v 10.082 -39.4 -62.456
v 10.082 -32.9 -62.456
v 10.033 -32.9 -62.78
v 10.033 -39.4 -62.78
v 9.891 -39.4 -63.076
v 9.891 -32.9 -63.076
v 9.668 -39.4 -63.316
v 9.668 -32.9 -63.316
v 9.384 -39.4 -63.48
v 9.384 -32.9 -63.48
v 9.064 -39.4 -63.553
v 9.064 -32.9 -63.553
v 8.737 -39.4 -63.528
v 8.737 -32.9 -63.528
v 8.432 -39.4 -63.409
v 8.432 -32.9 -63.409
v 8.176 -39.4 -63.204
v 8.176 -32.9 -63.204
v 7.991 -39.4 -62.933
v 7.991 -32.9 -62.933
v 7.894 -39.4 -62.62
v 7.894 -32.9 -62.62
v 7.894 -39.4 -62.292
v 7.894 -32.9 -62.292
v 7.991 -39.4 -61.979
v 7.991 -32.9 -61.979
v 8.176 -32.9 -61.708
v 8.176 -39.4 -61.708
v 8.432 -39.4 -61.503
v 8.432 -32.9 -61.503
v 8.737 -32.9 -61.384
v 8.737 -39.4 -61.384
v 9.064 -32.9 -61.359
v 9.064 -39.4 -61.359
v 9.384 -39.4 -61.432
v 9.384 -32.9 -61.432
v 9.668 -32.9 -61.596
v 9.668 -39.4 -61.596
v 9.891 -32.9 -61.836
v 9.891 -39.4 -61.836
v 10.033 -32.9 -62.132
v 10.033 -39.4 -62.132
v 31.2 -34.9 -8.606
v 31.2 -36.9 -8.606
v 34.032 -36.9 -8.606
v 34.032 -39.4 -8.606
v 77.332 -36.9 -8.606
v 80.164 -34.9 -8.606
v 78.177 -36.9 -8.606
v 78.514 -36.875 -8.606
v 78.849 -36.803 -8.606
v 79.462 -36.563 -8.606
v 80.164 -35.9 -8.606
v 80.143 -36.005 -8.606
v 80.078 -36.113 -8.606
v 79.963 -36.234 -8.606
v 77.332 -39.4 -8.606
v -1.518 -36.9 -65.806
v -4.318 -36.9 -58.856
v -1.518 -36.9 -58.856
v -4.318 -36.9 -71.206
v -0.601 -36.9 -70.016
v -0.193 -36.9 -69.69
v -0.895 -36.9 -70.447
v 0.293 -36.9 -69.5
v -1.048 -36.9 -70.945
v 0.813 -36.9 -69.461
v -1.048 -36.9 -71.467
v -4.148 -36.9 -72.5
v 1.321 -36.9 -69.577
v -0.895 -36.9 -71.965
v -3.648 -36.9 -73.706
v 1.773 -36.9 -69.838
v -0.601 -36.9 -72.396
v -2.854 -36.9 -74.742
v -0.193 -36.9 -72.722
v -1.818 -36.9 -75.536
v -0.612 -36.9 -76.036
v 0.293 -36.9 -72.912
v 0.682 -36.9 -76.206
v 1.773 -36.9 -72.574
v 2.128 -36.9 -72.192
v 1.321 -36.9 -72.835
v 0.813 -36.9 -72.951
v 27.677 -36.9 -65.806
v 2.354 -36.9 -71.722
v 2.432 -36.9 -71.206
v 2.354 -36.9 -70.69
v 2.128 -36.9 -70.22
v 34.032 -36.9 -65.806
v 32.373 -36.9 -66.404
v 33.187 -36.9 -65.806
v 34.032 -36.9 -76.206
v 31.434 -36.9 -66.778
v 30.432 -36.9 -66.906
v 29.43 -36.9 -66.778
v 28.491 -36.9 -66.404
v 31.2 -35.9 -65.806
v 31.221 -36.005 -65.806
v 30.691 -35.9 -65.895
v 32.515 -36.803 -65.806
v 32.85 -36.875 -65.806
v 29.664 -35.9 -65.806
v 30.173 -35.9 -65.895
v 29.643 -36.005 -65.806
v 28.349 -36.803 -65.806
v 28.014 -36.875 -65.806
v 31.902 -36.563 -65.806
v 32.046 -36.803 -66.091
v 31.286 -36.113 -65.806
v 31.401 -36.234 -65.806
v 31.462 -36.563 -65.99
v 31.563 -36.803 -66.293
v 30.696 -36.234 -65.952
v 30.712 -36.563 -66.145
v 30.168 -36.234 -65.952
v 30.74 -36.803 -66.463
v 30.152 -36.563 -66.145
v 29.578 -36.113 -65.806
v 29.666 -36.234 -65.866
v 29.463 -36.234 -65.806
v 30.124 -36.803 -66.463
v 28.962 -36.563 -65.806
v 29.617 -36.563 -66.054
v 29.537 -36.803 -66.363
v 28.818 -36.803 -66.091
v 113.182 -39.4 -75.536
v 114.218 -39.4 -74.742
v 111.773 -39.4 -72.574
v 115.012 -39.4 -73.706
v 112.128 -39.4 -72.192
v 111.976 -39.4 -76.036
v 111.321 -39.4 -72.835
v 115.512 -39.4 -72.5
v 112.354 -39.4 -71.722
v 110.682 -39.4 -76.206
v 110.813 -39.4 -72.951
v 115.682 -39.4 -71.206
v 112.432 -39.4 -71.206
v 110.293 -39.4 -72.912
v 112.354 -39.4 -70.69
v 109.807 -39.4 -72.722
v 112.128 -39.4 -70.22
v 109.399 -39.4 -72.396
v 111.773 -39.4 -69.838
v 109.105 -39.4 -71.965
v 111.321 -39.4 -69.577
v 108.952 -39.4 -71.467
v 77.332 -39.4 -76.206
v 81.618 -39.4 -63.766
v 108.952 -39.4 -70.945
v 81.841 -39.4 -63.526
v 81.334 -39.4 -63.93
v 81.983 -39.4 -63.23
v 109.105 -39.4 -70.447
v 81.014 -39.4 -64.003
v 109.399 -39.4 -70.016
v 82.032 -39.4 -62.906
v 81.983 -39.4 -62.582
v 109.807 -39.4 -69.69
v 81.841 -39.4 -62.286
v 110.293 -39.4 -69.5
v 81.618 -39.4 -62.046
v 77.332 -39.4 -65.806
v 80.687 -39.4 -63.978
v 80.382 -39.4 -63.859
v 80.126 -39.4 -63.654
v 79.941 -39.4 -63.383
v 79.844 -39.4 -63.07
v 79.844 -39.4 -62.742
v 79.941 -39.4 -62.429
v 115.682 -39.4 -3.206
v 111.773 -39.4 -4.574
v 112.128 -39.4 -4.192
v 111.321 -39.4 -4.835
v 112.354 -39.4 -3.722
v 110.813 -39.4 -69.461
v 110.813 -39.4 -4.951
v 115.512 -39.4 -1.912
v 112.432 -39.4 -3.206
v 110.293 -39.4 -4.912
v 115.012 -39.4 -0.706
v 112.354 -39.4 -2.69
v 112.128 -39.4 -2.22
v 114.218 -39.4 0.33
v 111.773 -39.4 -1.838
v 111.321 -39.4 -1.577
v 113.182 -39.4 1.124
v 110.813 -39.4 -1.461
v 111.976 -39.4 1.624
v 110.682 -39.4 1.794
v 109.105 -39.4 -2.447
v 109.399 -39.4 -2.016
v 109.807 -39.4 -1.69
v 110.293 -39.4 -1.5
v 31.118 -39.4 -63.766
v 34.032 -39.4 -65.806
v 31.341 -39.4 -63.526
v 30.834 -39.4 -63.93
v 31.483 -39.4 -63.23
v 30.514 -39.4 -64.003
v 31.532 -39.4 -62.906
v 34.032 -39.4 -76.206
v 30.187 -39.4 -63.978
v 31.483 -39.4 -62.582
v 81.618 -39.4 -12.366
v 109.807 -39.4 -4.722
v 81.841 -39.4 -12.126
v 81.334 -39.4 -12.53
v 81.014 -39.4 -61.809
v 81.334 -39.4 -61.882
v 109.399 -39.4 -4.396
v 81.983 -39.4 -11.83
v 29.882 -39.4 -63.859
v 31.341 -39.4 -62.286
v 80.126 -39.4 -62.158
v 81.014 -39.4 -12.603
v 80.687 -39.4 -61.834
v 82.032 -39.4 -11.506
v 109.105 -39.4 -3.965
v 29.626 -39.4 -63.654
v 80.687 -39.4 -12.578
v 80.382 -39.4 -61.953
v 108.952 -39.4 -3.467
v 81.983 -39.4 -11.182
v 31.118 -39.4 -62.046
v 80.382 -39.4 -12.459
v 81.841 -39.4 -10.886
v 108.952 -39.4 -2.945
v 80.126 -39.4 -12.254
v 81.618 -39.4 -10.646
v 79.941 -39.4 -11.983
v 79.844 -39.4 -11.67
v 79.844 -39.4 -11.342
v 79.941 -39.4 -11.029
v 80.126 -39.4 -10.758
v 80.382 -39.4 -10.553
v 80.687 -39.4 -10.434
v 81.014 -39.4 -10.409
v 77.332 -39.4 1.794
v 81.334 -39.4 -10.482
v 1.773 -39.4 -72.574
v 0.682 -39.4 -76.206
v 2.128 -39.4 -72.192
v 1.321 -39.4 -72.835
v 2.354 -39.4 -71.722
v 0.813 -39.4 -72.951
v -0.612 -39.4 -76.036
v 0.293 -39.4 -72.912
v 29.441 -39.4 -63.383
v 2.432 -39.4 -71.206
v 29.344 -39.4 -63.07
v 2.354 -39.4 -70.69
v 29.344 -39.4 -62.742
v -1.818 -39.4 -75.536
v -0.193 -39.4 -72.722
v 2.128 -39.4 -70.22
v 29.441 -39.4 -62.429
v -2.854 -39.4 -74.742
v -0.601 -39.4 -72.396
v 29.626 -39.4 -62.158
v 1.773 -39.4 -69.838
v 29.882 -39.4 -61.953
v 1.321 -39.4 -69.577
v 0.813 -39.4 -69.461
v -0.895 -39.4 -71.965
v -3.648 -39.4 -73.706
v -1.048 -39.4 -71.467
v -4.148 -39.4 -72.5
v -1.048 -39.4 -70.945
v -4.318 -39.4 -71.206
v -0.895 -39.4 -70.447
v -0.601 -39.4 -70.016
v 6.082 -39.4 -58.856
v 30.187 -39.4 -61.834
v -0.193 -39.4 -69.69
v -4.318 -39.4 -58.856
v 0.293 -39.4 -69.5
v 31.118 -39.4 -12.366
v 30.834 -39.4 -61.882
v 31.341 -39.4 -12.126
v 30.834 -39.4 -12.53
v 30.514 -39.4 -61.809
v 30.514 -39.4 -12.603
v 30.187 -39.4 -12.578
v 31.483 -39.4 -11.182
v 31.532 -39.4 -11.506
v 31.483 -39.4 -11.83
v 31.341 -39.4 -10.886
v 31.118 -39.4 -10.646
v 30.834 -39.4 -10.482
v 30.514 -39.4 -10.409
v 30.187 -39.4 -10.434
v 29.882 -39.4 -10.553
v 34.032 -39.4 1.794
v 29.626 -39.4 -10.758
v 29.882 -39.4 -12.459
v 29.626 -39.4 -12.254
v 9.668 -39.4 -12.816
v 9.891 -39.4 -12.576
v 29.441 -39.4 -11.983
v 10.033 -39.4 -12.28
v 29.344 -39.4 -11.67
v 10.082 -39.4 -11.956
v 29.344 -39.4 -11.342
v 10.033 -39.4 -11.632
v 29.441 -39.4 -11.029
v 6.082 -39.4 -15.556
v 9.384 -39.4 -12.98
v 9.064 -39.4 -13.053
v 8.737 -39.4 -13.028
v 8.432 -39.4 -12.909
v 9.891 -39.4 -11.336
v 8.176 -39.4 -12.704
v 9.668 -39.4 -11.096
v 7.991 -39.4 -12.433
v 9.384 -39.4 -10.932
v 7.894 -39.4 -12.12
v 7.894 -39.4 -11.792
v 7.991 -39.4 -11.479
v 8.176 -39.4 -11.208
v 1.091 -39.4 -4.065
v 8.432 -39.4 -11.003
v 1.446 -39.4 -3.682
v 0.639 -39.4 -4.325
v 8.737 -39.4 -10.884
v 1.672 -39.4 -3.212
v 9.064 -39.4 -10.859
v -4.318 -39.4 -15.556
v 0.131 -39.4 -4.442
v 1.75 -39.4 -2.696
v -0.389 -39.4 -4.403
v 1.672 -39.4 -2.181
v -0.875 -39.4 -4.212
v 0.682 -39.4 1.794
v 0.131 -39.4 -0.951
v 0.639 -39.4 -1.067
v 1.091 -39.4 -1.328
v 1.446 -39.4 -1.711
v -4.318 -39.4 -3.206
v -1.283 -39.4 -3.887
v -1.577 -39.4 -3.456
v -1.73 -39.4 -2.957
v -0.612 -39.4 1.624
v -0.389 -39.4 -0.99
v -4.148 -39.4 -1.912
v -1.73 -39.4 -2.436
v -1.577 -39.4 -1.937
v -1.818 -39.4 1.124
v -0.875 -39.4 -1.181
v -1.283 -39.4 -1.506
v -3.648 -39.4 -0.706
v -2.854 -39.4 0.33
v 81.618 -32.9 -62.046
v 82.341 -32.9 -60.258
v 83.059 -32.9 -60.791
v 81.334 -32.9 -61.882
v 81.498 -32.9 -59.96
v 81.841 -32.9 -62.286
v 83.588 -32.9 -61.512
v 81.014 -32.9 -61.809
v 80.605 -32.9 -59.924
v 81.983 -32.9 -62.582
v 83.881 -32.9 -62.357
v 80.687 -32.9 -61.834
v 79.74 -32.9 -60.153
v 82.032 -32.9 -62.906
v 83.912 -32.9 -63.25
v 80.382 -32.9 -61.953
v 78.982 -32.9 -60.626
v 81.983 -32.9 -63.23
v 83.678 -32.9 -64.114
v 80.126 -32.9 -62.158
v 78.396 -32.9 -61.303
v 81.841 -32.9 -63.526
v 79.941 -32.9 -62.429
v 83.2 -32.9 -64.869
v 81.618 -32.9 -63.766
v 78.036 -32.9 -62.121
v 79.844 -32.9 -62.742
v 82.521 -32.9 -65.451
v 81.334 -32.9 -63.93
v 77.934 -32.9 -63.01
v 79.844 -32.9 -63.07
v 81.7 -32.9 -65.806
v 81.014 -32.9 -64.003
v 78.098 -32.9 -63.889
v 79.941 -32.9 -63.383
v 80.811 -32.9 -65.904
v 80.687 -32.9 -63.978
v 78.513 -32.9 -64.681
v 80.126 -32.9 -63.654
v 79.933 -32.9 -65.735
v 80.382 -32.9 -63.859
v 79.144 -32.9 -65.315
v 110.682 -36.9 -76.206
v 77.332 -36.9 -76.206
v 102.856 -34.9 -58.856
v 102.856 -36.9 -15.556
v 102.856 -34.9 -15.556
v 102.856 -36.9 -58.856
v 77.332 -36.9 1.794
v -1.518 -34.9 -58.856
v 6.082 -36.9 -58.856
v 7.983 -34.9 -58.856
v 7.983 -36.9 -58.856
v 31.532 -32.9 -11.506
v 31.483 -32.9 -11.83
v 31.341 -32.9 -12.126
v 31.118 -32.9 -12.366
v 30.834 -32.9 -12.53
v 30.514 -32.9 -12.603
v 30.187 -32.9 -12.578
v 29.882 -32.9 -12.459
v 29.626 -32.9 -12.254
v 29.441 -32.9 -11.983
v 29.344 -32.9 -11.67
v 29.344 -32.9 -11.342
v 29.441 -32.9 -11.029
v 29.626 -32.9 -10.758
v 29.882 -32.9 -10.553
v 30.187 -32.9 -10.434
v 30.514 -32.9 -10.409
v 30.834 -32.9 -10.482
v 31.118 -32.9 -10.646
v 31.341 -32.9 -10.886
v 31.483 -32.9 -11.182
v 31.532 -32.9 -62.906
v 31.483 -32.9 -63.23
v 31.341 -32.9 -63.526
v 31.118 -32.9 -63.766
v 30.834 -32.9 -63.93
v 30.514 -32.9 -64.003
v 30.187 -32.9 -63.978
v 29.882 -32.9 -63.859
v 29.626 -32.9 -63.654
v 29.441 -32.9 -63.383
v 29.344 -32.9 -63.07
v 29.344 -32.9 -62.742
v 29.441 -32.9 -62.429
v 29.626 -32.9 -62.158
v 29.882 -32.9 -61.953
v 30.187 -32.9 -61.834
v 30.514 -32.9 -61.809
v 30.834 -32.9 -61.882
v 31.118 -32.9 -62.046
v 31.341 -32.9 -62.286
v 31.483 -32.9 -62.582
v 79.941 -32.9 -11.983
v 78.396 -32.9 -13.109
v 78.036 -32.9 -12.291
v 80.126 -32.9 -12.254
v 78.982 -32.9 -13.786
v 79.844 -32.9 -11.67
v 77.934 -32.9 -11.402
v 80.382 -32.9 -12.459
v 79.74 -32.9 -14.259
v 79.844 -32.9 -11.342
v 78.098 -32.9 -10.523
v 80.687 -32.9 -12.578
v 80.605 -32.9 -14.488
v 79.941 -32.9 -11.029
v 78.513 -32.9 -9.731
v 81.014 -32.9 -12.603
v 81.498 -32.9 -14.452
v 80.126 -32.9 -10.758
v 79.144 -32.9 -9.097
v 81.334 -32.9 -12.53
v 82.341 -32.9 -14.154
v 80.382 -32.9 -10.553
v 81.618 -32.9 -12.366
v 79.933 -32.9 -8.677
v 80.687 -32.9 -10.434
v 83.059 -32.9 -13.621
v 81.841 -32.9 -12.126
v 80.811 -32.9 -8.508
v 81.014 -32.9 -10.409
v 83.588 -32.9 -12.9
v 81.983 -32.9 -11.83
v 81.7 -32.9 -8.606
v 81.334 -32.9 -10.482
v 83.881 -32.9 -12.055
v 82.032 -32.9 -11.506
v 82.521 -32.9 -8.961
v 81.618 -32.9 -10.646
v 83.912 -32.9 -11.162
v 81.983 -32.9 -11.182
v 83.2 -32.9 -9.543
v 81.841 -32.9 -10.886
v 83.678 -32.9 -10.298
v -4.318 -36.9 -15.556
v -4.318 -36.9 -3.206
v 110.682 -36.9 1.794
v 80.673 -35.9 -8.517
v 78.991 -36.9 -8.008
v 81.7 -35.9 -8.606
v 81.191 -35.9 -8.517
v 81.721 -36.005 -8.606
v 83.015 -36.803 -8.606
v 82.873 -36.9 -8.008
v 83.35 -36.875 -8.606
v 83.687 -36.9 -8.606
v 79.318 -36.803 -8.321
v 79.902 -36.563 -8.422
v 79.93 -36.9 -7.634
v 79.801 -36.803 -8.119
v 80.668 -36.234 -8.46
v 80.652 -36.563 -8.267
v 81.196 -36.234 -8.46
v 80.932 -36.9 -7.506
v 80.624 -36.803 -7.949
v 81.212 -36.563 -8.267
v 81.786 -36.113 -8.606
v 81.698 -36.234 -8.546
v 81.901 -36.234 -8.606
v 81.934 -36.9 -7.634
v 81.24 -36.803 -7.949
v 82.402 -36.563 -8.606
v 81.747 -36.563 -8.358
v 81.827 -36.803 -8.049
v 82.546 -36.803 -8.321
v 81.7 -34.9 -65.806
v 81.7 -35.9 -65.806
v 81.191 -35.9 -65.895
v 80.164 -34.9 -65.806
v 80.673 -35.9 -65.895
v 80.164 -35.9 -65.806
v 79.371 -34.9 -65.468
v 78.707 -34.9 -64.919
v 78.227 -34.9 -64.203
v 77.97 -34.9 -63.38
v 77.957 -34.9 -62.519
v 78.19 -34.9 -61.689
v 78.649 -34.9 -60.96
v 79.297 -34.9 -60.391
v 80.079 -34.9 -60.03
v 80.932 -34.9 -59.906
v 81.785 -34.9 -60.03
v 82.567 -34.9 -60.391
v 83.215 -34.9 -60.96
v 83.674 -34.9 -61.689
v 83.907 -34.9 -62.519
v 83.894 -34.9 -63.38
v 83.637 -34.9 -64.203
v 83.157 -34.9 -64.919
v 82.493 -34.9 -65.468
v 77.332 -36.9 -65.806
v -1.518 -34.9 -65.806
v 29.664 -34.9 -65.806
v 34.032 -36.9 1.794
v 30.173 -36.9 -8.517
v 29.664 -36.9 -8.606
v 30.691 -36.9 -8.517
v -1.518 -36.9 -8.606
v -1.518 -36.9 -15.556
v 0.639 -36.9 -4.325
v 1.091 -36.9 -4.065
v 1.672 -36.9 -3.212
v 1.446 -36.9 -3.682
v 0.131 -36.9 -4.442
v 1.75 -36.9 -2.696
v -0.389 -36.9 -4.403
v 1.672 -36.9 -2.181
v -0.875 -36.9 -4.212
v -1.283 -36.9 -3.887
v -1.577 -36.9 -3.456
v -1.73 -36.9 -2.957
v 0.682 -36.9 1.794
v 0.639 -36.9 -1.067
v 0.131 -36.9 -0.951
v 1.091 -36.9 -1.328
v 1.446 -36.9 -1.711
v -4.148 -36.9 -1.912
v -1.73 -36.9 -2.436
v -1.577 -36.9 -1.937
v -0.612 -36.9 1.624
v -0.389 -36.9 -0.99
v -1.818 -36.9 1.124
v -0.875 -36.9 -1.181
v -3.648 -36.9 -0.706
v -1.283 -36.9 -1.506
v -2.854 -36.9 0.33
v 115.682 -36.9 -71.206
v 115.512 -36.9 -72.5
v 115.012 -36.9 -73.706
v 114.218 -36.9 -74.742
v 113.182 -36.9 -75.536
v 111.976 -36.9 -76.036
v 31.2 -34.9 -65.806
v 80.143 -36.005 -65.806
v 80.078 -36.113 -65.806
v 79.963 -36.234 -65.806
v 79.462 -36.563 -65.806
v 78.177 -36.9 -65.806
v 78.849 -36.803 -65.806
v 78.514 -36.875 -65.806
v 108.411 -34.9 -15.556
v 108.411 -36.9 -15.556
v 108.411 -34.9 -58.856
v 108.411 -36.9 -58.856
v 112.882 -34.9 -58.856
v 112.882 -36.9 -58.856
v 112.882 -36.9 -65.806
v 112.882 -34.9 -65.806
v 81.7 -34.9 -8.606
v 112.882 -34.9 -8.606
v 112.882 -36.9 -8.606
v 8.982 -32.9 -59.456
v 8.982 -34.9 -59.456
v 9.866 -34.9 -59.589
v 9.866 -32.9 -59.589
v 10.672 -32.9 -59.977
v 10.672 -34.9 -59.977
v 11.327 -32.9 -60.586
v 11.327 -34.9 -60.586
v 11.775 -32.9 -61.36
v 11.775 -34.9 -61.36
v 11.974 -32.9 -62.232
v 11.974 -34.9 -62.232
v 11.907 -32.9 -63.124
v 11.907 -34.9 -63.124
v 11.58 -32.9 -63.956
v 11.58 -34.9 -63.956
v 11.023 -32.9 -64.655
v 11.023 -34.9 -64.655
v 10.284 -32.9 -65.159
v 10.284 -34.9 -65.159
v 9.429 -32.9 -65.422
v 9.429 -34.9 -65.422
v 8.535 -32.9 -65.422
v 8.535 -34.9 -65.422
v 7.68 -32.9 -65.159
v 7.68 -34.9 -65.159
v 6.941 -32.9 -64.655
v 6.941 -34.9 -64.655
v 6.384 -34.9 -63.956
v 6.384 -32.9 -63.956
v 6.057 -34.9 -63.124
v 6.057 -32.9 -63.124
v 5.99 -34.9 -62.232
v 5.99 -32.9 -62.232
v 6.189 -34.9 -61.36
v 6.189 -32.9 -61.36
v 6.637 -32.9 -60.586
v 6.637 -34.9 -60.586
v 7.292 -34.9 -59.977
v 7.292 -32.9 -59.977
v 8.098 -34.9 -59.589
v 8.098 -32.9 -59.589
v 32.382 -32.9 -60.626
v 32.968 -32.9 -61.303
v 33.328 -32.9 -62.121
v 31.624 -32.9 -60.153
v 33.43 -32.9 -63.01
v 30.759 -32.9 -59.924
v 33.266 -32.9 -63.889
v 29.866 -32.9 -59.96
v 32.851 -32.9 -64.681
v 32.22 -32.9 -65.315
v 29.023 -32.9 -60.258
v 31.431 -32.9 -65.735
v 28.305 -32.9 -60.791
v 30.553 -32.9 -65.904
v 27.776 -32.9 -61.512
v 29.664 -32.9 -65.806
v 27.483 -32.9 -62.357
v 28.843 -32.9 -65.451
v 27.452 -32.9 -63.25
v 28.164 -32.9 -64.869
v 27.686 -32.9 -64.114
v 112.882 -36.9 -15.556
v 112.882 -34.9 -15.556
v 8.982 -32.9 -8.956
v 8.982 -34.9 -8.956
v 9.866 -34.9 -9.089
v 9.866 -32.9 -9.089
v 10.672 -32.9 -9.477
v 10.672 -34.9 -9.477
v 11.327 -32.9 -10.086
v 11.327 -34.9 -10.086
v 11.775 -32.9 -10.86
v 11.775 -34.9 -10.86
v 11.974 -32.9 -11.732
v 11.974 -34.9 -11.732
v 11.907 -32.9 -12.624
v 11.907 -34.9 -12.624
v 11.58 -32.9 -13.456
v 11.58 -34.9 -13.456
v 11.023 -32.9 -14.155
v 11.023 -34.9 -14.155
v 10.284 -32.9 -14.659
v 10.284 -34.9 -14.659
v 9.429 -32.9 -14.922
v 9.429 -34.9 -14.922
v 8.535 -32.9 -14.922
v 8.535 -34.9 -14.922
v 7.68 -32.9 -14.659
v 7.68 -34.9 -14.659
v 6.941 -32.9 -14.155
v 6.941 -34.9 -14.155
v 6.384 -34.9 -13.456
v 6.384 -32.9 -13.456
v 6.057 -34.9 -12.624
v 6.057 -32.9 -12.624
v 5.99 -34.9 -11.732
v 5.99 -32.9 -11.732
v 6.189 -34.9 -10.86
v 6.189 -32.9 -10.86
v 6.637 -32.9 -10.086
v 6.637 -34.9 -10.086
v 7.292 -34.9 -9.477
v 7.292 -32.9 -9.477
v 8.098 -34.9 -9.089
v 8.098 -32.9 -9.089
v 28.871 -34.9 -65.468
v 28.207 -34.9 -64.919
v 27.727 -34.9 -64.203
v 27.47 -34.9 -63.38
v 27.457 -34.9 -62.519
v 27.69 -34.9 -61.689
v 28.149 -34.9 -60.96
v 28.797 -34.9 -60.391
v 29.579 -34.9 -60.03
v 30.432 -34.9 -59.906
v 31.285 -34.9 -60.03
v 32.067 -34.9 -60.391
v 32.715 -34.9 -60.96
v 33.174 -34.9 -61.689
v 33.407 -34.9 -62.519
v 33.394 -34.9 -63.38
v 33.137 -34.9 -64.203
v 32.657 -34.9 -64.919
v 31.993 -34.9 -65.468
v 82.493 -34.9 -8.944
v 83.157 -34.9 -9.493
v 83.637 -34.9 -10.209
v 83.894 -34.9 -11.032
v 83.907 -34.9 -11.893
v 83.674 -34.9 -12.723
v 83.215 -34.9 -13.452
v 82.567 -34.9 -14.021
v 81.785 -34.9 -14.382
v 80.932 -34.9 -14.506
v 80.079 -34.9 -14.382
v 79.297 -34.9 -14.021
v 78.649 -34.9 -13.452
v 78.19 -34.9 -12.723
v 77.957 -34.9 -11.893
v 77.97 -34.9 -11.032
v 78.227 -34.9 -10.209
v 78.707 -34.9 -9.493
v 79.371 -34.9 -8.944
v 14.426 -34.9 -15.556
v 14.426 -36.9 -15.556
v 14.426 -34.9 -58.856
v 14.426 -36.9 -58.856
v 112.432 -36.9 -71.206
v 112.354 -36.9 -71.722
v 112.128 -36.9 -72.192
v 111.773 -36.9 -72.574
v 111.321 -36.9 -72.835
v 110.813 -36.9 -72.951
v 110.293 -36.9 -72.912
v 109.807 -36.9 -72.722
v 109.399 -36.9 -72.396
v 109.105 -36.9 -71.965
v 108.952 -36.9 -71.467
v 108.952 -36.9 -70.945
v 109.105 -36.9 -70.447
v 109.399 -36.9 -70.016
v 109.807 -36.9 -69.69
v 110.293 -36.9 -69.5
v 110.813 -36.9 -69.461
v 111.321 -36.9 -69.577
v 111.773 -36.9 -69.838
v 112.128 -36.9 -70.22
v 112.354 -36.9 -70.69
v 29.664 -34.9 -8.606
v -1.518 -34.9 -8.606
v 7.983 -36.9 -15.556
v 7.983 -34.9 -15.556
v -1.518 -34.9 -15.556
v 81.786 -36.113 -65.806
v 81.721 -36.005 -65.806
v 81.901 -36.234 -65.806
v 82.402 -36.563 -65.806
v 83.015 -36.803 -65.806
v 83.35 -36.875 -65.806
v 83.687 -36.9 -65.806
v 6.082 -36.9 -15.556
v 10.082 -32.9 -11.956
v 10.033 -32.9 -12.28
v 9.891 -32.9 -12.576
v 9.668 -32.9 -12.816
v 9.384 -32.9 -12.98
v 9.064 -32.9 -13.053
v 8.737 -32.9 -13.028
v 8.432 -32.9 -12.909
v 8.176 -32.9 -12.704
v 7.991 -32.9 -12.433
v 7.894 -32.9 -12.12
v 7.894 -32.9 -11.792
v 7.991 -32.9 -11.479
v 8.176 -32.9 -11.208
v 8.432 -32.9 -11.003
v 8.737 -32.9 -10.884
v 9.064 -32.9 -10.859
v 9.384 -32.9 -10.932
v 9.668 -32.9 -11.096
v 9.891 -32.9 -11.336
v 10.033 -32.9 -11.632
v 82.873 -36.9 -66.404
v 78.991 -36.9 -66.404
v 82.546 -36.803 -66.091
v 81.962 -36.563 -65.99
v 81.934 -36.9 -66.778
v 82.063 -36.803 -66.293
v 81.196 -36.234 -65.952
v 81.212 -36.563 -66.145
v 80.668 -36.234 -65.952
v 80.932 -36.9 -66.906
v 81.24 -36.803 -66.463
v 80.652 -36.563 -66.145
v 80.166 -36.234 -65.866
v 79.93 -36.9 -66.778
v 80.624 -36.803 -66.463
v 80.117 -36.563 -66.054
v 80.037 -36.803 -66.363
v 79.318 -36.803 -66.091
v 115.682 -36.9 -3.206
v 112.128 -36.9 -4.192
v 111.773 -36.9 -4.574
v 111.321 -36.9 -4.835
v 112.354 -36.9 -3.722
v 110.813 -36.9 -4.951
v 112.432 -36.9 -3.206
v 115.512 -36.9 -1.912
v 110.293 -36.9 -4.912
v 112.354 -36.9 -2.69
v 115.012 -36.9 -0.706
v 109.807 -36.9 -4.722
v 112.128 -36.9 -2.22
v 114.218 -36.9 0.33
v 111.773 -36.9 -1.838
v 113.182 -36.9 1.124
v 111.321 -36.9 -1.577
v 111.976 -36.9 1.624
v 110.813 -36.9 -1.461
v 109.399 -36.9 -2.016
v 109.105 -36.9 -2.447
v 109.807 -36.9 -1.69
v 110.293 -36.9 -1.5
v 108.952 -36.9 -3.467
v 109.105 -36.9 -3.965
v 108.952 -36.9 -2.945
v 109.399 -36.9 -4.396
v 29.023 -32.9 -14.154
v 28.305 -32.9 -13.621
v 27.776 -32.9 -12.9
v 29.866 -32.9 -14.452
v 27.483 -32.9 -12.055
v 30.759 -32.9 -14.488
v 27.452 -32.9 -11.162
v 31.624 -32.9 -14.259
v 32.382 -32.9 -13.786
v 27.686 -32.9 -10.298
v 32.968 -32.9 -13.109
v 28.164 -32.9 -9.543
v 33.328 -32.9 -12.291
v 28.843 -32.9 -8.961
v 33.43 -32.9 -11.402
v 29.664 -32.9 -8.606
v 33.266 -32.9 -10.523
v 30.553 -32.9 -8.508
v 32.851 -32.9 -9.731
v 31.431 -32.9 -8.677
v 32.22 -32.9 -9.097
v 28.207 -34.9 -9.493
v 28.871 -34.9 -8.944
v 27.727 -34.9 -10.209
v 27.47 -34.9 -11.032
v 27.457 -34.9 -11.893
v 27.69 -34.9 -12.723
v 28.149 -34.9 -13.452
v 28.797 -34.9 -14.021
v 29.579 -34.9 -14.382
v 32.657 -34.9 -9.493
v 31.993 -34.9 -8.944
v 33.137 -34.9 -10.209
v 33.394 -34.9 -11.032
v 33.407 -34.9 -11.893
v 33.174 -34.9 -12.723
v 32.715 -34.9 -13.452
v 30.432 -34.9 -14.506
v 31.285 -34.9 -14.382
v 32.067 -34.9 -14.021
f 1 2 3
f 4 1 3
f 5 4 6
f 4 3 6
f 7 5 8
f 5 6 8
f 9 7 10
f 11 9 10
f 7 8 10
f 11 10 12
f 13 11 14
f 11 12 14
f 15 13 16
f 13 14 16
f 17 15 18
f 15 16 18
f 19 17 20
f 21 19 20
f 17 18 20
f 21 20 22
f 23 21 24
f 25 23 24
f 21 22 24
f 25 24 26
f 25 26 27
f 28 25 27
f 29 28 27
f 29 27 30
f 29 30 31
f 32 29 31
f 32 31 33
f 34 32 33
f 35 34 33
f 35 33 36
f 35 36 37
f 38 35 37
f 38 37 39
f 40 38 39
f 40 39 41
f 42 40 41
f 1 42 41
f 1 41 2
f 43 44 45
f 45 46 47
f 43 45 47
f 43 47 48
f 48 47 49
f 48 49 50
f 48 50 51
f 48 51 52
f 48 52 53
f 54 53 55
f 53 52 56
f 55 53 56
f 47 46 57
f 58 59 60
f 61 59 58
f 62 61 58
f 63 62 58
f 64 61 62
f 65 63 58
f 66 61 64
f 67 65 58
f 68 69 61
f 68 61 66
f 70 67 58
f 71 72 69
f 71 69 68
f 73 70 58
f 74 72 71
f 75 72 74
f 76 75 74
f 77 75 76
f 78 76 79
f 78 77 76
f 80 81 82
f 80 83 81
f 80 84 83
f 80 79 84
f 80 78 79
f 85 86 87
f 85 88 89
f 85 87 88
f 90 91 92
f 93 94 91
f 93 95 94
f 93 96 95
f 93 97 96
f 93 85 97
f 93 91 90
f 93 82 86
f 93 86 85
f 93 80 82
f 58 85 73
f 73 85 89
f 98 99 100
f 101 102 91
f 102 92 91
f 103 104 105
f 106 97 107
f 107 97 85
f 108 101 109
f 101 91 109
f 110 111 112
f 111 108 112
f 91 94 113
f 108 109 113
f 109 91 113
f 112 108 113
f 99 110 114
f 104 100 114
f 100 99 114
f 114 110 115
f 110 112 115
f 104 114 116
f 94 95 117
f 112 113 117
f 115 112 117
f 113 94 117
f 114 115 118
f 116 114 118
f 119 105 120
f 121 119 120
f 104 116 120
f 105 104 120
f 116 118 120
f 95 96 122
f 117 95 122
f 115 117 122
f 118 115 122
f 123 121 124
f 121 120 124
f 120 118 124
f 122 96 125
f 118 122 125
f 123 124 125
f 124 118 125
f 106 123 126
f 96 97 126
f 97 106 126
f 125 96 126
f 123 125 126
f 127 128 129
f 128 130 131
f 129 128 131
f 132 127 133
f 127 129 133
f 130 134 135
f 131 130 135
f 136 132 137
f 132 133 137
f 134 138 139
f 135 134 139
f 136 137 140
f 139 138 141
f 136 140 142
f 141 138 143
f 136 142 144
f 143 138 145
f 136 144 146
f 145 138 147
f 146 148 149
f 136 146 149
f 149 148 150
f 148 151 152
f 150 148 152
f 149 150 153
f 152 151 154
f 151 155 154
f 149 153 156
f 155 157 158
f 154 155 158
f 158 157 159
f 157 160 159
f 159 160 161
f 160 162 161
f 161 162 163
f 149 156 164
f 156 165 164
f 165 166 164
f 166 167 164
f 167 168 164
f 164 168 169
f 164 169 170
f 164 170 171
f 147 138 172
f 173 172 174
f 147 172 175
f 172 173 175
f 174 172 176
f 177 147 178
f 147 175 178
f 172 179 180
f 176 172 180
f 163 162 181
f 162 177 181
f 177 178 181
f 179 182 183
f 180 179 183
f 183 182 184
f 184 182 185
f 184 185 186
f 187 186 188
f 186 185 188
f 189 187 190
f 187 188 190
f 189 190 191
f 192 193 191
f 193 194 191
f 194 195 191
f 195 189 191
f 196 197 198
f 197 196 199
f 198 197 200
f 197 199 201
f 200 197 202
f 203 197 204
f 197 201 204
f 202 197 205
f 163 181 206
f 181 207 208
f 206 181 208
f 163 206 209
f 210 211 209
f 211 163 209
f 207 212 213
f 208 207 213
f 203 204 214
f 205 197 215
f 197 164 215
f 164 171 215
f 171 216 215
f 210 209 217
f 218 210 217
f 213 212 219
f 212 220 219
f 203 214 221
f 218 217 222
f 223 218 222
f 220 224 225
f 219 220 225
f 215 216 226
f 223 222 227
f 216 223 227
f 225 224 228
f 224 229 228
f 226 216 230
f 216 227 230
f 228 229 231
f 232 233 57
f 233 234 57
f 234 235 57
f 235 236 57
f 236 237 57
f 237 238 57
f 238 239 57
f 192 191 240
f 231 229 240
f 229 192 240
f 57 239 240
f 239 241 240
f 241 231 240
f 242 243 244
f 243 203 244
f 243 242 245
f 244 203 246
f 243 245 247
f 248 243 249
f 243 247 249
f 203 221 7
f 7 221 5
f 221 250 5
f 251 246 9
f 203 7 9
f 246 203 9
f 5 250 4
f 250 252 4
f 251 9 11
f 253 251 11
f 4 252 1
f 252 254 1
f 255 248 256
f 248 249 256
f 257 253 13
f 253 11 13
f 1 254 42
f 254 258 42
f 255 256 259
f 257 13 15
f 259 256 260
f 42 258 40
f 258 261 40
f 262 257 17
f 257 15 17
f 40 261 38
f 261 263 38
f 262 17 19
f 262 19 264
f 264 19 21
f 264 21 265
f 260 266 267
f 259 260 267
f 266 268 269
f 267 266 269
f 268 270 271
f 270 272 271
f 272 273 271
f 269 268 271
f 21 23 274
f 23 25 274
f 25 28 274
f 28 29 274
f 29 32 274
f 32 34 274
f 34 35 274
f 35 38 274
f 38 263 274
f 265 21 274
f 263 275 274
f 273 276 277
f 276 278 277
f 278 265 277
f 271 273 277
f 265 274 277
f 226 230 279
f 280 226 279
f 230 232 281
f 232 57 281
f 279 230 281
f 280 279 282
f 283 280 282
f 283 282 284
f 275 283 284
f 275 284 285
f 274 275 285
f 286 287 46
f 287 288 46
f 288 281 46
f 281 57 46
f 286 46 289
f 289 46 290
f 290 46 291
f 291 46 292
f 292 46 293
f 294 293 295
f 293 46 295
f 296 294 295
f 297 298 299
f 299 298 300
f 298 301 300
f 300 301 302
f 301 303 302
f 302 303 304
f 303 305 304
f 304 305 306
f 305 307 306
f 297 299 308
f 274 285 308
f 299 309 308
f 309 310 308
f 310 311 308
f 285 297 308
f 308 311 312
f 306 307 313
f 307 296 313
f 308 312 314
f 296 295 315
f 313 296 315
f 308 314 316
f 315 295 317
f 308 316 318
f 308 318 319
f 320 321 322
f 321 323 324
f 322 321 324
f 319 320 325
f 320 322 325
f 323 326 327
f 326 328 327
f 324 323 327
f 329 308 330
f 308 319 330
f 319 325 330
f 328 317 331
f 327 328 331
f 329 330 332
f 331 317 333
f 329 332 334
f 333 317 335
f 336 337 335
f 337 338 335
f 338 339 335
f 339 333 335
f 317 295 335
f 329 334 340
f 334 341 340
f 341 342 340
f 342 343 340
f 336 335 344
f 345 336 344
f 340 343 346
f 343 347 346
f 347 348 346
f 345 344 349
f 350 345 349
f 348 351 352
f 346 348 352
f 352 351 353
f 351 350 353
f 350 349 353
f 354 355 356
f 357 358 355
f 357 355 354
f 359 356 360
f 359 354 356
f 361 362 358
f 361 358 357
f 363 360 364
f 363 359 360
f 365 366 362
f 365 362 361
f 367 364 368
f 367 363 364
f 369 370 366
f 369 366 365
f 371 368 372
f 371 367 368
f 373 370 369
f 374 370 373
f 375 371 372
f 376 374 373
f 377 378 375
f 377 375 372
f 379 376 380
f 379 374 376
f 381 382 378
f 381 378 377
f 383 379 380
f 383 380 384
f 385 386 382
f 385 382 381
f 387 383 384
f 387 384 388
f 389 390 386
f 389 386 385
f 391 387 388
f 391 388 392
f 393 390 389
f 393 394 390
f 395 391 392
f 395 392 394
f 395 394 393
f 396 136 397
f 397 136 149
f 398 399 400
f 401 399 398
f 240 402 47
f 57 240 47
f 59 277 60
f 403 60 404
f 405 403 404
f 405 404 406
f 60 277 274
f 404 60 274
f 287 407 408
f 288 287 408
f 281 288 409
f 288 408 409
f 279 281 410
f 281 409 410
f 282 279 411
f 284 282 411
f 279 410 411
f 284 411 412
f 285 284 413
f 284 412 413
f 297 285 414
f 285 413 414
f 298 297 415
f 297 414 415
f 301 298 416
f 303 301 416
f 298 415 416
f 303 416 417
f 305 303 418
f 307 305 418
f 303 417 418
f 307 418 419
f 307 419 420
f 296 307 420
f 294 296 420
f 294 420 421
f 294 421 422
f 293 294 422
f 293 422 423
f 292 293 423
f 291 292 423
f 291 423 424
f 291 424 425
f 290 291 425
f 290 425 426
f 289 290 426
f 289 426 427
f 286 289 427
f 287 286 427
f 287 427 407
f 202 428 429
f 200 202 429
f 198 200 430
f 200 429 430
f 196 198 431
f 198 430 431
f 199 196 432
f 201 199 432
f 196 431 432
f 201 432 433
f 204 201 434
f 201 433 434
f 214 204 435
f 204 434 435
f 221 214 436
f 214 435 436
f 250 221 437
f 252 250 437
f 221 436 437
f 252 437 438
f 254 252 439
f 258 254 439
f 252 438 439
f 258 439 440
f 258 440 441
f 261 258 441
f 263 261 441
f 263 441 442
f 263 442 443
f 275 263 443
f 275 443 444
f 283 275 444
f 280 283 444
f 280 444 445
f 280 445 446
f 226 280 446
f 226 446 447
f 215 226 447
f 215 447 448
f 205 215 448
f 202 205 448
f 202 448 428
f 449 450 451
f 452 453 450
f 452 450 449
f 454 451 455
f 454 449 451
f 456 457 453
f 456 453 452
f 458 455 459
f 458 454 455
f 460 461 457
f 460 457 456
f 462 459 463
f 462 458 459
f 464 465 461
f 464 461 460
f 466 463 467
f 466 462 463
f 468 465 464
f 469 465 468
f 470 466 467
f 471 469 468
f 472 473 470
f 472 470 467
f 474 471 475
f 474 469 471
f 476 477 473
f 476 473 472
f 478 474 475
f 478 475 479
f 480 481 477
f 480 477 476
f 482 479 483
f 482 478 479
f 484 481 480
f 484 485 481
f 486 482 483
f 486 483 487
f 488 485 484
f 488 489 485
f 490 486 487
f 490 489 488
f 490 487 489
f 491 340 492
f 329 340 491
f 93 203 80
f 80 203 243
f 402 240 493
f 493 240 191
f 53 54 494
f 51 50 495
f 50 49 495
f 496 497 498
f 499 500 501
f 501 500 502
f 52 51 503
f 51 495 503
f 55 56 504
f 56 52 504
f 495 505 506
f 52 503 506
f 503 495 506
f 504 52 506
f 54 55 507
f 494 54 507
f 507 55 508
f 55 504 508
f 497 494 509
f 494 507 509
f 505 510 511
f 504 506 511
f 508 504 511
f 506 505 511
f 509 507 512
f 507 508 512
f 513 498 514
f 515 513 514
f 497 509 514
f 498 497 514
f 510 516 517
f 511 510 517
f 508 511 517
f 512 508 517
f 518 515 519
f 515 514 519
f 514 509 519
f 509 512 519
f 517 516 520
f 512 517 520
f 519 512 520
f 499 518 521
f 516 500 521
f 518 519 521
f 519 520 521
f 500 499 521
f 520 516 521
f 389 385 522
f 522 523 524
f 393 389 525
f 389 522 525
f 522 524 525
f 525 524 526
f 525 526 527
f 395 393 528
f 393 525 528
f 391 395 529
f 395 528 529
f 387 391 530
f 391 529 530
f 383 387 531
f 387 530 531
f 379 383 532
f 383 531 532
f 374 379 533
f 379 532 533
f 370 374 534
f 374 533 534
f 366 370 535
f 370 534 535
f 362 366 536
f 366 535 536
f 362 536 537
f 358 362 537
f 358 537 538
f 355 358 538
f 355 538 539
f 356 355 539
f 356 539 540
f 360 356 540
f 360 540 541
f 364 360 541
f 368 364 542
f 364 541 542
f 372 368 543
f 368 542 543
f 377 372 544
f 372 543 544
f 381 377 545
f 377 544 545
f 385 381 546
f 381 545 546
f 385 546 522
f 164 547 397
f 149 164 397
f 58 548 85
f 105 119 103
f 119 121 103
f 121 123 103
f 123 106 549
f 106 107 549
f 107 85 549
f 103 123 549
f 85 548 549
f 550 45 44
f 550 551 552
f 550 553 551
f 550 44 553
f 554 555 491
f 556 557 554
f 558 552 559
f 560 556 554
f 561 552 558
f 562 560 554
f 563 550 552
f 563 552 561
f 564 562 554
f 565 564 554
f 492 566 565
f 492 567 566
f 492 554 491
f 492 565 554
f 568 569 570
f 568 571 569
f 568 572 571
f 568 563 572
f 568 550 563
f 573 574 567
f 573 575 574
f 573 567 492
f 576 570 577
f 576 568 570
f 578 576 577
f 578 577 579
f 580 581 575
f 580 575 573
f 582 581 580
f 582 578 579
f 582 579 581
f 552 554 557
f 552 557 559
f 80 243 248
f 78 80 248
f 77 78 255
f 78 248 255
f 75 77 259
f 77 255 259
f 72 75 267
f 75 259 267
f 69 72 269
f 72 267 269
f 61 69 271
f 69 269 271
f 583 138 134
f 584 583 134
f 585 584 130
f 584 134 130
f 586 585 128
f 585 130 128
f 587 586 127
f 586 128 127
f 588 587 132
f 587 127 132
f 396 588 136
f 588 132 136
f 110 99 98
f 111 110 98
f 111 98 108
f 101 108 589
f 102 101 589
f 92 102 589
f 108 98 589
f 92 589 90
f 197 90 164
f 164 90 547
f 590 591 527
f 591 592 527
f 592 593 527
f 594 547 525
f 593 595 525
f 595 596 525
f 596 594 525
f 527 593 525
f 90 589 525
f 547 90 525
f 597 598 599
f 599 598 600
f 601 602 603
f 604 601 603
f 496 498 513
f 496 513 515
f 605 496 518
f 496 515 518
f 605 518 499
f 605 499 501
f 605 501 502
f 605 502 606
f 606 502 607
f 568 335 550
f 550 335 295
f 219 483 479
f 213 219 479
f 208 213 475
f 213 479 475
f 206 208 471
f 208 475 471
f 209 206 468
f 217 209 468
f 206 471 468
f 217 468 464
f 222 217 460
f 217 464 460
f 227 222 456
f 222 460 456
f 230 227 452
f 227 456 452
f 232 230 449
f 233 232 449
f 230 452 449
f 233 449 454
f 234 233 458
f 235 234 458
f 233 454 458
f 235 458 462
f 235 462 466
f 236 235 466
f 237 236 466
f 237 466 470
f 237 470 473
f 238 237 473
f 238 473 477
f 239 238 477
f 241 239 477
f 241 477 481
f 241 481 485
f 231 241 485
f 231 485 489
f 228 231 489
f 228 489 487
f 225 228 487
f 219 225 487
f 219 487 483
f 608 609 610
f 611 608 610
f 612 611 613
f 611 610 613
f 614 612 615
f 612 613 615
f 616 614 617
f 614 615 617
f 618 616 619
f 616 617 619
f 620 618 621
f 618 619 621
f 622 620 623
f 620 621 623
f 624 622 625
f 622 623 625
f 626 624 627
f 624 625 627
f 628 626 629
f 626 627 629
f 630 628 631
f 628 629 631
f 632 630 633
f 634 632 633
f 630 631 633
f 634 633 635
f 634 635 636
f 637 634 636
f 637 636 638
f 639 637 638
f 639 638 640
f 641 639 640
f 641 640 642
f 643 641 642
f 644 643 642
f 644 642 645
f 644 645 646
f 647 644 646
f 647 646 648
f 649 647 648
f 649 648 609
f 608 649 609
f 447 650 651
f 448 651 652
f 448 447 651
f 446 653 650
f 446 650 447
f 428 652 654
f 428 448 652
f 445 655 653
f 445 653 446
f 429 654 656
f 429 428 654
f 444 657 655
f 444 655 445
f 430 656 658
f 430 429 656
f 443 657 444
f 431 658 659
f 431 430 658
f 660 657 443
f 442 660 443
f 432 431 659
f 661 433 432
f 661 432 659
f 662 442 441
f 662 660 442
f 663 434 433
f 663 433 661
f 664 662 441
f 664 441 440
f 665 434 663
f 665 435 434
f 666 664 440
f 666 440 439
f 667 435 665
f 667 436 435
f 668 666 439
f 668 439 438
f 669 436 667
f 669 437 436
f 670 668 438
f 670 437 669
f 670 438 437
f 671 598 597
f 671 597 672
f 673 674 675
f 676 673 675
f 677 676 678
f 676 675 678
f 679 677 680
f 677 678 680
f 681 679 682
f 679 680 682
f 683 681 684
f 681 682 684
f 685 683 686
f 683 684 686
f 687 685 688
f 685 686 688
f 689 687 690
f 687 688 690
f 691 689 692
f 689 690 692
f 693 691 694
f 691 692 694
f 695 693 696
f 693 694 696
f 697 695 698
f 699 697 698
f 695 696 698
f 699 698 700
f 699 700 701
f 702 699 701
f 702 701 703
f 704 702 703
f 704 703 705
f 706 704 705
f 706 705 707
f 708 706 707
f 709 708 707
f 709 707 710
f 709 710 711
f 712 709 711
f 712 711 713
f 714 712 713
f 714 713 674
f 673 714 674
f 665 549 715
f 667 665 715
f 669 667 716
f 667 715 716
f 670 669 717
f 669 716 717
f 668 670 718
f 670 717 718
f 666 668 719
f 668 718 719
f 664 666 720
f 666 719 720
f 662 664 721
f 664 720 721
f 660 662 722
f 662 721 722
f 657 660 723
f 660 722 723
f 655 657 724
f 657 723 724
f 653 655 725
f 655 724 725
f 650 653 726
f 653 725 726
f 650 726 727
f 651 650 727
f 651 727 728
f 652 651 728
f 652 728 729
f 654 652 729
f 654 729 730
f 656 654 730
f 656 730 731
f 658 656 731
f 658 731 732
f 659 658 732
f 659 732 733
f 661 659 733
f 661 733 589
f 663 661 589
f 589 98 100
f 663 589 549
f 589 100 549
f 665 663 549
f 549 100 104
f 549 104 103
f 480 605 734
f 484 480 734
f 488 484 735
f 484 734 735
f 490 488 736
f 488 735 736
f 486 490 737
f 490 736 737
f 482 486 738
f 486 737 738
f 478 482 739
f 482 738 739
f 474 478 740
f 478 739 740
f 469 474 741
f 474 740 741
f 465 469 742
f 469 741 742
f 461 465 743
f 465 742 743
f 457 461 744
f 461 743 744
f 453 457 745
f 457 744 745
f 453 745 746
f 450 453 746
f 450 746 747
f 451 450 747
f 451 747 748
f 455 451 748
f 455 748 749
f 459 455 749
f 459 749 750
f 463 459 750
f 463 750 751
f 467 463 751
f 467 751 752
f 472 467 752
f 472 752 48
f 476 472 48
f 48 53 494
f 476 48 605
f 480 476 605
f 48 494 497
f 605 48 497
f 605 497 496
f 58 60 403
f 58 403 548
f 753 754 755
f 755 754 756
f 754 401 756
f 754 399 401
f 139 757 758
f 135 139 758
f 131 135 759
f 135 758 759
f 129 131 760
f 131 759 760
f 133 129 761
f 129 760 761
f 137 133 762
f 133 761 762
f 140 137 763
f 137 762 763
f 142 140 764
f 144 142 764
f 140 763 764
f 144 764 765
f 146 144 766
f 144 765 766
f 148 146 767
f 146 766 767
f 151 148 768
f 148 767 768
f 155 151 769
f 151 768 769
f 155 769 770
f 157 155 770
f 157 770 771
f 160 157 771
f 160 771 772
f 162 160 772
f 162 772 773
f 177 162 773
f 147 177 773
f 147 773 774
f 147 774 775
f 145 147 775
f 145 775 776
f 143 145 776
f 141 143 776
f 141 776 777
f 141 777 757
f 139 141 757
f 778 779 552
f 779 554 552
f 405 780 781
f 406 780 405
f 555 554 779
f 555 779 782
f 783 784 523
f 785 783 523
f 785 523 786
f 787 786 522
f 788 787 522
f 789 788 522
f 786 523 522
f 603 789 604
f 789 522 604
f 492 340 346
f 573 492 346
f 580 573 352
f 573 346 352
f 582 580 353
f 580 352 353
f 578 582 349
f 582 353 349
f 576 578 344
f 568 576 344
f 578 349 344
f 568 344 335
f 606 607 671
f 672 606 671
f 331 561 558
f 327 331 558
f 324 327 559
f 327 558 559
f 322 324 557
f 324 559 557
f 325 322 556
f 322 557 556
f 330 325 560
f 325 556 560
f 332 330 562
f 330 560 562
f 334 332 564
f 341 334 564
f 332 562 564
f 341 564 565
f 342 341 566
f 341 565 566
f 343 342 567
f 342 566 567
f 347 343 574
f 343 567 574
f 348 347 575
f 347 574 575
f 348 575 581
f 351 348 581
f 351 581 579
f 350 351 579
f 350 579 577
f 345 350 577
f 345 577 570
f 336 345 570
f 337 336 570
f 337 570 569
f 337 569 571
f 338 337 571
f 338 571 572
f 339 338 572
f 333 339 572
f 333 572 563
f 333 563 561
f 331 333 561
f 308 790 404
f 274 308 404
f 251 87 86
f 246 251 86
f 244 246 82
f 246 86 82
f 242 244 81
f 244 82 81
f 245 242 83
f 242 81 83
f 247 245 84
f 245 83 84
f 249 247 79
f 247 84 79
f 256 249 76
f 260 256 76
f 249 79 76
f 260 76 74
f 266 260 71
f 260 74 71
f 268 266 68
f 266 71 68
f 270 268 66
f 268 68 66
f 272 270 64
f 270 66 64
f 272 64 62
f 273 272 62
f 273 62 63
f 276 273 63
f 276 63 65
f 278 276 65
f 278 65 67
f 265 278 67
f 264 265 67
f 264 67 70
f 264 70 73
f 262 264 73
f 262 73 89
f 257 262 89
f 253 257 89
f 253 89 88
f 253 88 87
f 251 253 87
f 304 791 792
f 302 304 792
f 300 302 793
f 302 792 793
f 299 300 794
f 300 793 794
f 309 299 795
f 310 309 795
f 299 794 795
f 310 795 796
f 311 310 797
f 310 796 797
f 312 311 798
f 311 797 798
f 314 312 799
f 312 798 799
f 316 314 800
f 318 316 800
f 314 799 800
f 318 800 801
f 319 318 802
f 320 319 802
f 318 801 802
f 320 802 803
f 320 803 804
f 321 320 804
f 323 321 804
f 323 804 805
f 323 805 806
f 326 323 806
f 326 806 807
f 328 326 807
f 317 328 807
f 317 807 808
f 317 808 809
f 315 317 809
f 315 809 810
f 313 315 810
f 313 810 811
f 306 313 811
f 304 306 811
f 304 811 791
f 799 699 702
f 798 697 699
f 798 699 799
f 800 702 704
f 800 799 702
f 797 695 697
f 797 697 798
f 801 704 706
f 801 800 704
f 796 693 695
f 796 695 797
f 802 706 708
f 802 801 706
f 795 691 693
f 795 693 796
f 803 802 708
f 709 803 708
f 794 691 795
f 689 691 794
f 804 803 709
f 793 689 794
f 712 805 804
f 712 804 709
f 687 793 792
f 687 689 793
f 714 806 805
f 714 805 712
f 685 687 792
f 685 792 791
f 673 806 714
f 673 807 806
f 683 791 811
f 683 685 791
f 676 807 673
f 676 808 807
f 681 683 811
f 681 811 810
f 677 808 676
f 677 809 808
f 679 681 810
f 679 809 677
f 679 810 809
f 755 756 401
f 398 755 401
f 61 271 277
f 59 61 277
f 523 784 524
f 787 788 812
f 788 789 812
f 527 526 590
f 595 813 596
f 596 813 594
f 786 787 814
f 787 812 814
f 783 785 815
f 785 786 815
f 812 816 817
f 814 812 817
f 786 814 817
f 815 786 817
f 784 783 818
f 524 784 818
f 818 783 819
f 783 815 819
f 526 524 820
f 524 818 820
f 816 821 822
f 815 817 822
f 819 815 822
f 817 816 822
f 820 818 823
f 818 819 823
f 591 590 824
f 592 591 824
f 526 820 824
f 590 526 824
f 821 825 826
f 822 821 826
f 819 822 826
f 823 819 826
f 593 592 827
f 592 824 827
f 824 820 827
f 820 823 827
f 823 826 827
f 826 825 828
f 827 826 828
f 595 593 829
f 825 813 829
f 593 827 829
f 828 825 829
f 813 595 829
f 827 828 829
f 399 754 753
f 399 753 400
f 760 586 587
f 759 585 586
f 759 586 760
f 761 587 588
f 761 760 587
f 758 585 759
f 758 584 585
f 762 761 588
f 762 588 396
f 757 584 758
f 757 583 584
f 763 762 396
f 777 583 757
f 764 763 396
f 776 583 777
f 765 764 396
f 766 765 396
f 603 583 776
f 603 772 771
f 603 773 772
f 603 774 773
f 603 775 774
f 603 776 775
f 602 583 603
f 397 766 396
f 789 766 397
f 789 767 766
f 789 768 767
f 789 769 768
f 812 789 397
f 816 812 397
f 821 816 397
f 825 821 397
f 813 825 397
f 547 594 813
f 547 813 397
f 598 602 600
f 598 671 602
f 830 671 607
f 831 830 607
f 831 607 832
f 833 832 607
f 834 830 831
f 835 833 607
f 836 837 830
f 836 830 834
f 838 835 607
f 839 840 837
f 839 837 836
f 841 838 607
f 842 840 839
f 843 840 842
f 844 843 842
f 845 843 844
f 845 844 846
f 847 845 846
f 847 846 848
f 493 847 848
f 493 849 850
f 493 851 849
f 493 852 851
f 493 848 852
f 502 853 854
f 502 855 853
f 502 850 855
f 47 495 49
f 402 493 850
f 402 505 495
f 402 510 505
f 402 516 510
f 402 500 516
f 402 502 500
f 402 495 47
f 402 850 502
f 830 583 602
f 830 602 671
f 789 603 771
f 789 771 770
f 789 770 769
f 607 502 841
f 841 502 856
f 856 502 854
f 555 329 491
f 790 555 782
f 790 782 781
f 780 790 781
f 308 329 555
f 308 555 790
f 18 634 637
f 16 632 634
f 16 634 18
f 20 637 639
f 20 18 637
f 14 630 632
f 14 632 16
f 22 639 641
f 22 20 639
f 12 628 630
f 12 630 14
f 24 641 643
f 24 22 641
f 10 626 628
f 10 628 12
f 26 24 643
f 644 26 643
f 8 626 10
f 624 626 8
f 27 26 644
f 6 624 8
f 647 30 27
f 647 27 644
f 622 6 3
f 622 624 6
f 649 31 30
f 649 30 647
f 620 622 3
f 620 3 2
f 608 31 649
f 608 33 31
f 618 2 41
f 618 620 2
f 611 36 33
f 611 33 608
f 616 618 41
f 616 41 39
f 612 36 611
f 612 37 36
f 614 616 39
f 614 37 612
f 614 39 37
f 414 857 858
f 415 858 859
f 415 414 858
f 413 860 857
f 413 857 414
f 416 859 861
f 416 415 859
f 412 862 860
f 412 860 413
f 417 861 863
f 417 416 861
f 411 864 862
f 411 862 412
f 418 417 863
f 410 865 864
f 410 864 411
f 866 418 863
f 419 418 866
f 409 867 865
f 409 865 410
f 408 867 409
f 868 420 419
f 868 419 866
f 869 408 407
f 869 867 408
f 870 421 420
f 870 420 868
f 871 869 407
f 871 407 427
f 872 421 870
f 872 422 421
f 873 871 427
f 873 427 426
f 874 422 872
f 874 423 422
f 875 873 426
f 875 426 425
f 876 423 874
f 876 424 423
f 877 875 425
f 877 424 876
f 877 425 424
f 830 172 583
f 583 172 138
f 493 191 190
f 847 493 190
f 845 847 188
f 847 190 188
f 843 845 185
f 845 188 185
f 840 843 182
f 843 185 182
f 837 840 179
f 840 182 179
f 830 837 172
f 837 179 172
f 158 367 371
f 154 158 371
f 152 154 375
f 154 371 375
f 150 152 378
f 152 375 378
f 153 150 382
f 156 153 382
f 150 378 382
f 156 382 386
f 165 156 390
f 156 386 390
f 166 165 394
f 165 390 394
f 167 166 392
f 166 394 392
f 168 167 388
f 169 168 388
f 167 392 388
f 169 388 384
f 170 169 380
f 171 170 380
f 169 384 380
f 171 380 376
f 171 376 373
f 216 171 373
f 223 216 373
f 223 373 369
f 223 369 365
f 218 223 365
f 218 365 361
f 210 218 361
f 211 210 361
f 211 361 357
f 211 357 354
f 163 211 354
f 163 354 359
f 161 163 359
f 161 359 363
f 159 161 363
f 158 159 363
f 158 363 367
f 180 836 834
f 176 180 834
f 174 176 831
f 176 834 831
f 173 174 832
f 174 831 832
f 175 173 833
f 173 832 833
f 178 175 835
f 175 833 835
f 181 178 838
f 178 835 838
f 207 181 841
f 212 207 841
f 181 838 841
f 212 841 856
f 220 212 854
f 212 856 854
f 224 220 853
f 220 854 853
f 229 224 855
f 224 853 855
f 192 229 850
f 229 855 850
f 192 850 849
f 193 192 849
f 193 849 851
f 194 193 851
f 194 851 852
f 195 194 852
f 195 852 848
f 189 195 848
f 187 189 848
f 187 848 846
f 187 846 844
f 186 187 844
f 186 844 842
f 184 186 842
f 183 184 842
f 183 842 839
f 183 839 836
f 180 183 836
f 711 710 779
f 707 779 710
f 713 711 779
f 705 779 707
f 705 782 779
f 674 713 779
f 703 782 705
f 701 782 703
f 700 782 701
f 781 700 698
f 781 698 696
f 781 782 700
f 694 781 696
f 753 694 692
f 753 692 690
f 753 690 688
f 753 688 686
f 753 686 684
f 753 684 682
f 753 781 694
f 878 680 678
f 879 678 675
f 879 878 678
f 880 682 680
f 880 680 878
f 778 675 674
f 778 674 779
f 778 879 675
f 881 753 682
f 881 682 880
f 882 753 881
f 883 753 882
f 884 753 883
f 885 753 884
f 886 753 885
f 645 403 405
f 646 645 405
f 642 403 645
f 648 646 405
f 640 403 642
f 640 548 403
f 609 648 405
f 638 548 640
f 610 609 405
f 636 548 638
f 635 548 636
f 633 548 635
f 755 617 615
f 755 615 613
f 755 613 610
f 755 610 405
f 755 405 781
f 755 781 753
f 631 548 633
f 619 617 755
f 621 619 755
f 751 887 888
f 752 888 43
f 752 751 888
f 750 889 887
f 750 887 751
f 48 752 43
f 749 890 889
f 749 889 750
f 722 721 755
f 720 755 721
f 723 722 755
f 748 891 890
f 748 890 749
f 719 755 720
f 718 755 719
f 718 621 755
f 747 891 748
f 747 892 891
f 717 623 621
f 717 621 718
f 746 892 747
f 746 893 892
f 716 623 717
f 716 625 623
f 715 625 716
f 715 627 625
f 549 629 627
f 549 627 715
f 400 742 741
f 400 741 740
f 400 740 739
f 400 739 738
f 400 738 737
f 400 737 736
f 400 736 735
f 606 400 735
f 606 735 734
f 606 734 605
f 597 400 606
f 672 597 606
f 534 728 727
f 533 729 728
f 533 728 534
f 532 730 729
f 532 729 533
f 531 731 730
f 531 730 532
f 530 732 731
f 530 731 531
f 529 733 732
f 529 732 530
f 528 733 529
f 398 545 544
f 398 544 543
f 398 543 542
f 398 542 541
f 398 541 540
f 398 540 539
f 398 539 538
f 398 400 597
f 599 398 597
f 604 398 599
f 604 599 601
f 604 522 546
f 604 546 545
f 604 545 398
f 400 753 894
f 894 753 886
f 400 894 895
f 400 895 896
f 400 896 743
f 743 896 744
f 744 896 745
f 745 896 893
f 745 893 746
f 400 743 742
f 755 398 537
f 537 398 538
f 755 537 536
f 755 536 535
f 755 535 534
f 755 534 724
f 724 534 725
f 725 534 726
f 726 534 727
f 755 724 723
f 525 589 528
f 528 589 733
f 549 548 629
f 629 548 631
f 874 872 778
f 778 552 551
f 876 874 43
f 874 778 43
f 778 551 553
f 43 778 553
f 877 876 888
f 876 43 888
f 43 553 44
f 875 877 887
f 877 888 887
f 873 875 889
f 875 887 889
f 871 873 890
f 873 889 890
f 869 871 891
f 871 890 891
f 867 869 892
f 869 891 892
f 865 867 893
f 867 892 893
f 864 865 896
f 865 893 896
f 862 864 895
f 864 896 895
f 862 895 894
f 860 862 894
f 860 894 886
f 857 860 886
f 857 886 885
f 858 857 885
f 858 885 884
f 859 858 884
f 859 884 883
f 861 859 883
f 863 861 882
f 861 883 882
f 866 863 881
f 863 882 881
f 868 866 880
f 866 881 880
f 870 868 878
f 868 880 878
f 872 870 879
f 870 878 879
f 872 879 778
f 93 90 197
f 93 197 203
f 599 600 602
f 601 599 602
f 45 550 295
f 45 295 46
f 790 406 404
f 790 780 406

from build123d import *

# Parameters (mm, degrees)
P_IDAT_VYSUNUT_M1_DEPTH      = 2.5
SKICA2_W                     = 43.3
SKICA2_H                     = 10.4
SKICA2_W_2                   = 10.4
SKICA2_H_2                   = 43.3
ODEBRAT_VYSUNUT_M1_DEPTH     = 139.549375892
SKICA6_W                     = 120
SKICA6_H                     = 6.95
P_IDAT_VYSUNUT_M3_DEPTH      = 2
SKICA7_W                     = 5.554617132
SKICA7_H                     = 57.2
SKICA7_W_2                   = 6.443355873
P_IDAT_VYSUNUT_M4_DEPTH      = 2
SKICA3_R                     = 3
P_IDAT_VYSUNUT_M2_DEPTH      = 4
F_2_2_2_2_PR_M_R_D_RY1_D     = 2.2
F_2_2_2_2_PR_M_R_D_RY1_DEPTH = 10
ZAOBLIT1_R                   = 1
SKICA8_W                     = 2.8
SKICA8_H                     = 57.2
ODEBRAT_VYSUNUT_M3_DEPTH     = 139.58455752
F_3_5_3_5_PR_M_R_D_RY1_D     = 3.5
F_3_5_3_5_PR_M_R_D_RY1_DEPTH = 10


with BuildPart() as part:
    # Skica1 → Přidat vysunutím1 (new body)
    with BuildSketch(Plane.XZ.offset(39.4)):
        with BuildLine():
            Line((-4.318, -71.206), (-4.318, -3.206))
            ThreePointArc((-4.318, -3.206), (-2.853533906, 0.329533906), (0.682, 1.794))
            Line((0.682, 1.794), (110.682, 1.794))
            ThreePointArc((110.682, 1.794), (114.217533906, 0.329533906), (115.682, -3.206))
            Line((115.682, -3.206), (115.682, -71.206))
            ThreePointArc((115.682, -71.206), (114.217533906, -74.741533906), (110.682, -76.206))
            Line((110.682, -76.206), (0.682, -76.206))
            ThreePointArc((0.682, -76.206), (-2.853533906, -74.741533906), (-4.318, -71.206))
        make_face()
    extrude(amount=-P_IDAT_VYSUNUT_M1_DEPTH)

    # Skica2 → Odebrat vysunutím1 (cut, through all)
    with BuildSketch(Plane(origin=(0, -36.9, 0), x_dir=(1, 0, 0), z_dir=(0, 1, 0))):
        with Locations((55.682, 3.406)):
            Rectangle(SKICA2_W, SKICA2_H)
        with Locations((0.882, 37.206)):
            Rectangle(SKICA2_W_2, SKICA2_H_2)
        with Locations((55.682, 71.006)):
            Rectangle(SKICA2_W, SKICA2_H)
    extrude(amount=-ODEBRAT_VYSUNUT_M1_DEPTH, mode=Mode.SUBTRACT)

    # Skica6 → Přidat vysunutím3 (add)
    with BuildSketch(Plane(origin=(0, -36.9, 0), x_dir=(1, 0, 0), z_dir=(0, 1, 0))):
        with Locations((55.682, 12.081)):
            Rectangle(SKICA6_W, SKICA6_H)
        with Locations((55.682, 62.331)):
            Rectangle(SKICA6_W, SKICA6_H)
    extrude(amount=P_IDAT_VYSUNUT_M3_DEPTH)

    # Skica7 → Přidat vysunutím4 (add)
    with BuildSketch(Plane(origin=(0, -36.9, 0), x_dir=(1, 0, 0), z_dir=(0, 1, 0))):
        with Locations((105.633212162, 37.206)):
            Rectangle(SKICA7_W, SKICA7_H)
        with Locations((11.204720922, 37.206)):
            Rectangle(SKICA7_W_2, SKICA7_H)
    extrude(amount=P_IDAT_VYSUNUT_M4_DEPTH)

    # Skica3 → Přidat vysunutím2 (add)
    with BuildSketch(Plane(origin=(0, -36.9, 0), x_dir=(1, 0, 0), z_dir=(0, 1, 0))):
        with Locations(Location((30.432, 11.506, 0), (0, 0, 255.164888418))):
            Circle(SKICA3_R)
        with Locations(Location((8.982, 11.956, 0), (0, 0, 270))):
            Circle(SKICA3_R)
        with Locations(Location((8.982, 62.456, 0), (0, 0, 270))):
            Circle(SKICA3_R)
        with Locations(Location((30.432, 62.906, 0), (0, 0, 104.835111582))):
            Circle(SKICA3_R)
        with Locations(Location((80.932, 62.906, 0), (0, 0, 75.164888418))):
            Circle(SKICA3_R)
        with Locations(Location((80.932, 11.506, 0), (0, 0, 284.835111582))):
            Circle(SKICA3_R)
    extrude(amount=P_IDAT_VYSUNUT_M2_DEPTH)

    # Ø2.2 (2.2) průměr díry1
    with Locations(Plane(origin=(0, -39.4, 0), x_dir=(-1, 0, 0), z_dir=(0, -1, 0))):
        with Locations((-8.982, 62.456), (-30.432, 62.906), (-80.932, 62.906), (-80.932, 11.506), (-30.432, 11.506), (-8.982, 11.956)):
            Hole(F_2_2_2_2_PR_M_R_D_RY1_D / 2, depth=F_2_2_2_2_PR_M_R_D_RY1_DEPTH)

    # Zaoblit1
    zaoblit1_edges = [part.edges().sort_by_distance(p)[0] for p in [
        (80.932, -36.9, -8.506),
        (80.932, -36.9, -65.906),
        (30.432, -36.9, -65.906),
    ]]
    fillet(zaoblit1_edges, radius=ZAOBLIT1_R)

    # Skica8 → Odebrat vysunutím3 (cut, through all)
    with BuildSketch(Plane(origin=(0, -36.9, 0), x_dir=(1, 0, 0), z_dir=(0, 1, 0))):
        with Locations((-2.918, 37.206)):
            Rectangle(SKICA8_W, SKICA8_H)
        with Locations((114.282, 37.206)):
            Rectangle(SKICA8_W, SKICA8_H)
    extrude(amount=ODEBRAT_VYSUNUT_M3_DEPTH, mode=Mode.SUBTRACT)

    # Ø3.5 (3.5) průměr díry1
    with Locations(Plane(origin=(0, -39.4, 0), x_dir=(-1, 0, 0), z_dir=(0, -1, 0))):
        with Locations((0, 2.696455625), (-0.682, 71.206), (-110.682, 71.206), (-110.682, 3.206)):
            Hole(F_3_5_3_5_PR_M_R_D_RY1_D / 2, depth=F_3_5_3_5_PR_M_R_D_RY1_DEPTH)


solid = part.part
